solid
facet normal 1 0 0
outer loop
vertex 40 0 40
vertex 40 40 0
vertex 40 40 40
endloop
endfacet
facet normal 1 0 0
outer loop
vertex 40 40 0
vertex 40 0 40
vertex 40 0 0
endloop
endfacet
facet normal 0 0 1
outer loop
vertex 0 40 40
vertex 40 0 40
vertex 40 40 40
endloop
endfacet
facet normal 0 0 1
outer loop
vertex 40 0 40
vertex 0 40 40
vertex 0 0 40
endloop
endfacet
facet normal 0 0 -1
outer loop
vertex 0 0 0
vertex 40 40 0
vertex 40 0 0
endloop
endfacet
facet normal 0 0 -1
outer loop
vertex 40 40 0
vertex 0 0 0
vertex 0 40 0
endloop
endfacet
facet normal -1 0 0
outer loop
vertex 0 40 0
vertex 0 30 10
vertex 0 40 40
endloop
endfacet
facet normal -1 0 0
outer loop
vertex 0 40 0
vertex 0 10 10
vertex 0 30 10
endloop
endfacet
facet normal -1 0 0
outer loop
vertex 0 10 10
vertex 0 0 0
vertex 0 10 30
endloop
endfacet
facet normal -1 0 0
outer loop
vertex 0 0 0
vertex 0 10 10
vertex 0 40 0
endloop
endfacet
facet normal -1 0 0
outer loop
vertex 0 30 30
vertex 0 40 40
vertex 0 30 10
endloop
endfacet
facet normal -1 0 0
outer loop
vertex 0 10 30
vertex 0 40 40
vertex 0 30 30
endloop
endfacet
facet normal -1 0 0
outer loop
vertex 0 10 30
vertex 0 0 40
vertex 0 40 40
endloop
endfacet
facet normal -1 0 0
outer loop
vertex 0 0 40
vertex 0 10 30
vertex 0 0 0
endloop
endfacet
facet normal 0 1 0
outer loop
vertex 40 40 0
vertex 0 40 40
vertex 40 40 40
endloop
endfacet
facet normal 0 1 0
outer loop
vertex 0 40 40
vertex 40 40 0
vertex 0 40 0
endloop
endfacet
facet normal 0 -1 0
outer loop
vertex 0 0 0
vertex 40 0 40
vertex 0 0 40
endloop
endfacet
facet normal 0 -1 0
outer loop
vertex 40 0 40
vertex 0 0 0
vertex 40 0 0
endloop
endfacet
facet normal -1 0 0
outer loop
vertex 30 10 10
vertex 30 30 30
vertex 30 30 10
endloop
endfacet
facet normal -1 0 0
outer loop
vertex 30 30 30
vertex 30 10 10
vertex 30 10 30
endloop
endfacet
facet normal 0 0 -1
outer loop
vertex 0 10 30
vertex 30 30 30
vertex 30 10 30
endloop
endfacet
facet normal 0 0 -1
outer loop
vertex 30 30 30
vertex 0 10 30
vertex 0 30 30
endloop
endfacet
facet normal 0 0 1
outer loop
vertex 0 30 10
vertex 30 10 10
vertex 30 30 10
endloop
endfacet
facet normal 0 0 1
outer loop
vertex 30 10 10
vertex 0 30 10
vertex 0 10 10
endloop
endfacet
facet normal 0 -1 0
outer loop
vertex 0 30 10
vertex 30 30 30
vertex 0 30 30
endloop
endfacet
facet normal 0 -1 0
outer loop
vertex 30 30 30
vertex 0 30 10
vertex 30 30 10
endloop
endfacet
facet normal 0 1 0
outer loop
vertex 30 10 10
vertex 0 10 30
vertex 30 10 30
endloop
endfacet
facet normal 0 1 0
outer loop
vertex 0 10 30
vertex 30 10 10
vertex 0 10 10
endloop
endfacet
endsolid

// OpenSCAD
difference() {
	cube(40);
	translate([0, 10, 10]) {
		cube([30, 20, 20]);
	}
}
